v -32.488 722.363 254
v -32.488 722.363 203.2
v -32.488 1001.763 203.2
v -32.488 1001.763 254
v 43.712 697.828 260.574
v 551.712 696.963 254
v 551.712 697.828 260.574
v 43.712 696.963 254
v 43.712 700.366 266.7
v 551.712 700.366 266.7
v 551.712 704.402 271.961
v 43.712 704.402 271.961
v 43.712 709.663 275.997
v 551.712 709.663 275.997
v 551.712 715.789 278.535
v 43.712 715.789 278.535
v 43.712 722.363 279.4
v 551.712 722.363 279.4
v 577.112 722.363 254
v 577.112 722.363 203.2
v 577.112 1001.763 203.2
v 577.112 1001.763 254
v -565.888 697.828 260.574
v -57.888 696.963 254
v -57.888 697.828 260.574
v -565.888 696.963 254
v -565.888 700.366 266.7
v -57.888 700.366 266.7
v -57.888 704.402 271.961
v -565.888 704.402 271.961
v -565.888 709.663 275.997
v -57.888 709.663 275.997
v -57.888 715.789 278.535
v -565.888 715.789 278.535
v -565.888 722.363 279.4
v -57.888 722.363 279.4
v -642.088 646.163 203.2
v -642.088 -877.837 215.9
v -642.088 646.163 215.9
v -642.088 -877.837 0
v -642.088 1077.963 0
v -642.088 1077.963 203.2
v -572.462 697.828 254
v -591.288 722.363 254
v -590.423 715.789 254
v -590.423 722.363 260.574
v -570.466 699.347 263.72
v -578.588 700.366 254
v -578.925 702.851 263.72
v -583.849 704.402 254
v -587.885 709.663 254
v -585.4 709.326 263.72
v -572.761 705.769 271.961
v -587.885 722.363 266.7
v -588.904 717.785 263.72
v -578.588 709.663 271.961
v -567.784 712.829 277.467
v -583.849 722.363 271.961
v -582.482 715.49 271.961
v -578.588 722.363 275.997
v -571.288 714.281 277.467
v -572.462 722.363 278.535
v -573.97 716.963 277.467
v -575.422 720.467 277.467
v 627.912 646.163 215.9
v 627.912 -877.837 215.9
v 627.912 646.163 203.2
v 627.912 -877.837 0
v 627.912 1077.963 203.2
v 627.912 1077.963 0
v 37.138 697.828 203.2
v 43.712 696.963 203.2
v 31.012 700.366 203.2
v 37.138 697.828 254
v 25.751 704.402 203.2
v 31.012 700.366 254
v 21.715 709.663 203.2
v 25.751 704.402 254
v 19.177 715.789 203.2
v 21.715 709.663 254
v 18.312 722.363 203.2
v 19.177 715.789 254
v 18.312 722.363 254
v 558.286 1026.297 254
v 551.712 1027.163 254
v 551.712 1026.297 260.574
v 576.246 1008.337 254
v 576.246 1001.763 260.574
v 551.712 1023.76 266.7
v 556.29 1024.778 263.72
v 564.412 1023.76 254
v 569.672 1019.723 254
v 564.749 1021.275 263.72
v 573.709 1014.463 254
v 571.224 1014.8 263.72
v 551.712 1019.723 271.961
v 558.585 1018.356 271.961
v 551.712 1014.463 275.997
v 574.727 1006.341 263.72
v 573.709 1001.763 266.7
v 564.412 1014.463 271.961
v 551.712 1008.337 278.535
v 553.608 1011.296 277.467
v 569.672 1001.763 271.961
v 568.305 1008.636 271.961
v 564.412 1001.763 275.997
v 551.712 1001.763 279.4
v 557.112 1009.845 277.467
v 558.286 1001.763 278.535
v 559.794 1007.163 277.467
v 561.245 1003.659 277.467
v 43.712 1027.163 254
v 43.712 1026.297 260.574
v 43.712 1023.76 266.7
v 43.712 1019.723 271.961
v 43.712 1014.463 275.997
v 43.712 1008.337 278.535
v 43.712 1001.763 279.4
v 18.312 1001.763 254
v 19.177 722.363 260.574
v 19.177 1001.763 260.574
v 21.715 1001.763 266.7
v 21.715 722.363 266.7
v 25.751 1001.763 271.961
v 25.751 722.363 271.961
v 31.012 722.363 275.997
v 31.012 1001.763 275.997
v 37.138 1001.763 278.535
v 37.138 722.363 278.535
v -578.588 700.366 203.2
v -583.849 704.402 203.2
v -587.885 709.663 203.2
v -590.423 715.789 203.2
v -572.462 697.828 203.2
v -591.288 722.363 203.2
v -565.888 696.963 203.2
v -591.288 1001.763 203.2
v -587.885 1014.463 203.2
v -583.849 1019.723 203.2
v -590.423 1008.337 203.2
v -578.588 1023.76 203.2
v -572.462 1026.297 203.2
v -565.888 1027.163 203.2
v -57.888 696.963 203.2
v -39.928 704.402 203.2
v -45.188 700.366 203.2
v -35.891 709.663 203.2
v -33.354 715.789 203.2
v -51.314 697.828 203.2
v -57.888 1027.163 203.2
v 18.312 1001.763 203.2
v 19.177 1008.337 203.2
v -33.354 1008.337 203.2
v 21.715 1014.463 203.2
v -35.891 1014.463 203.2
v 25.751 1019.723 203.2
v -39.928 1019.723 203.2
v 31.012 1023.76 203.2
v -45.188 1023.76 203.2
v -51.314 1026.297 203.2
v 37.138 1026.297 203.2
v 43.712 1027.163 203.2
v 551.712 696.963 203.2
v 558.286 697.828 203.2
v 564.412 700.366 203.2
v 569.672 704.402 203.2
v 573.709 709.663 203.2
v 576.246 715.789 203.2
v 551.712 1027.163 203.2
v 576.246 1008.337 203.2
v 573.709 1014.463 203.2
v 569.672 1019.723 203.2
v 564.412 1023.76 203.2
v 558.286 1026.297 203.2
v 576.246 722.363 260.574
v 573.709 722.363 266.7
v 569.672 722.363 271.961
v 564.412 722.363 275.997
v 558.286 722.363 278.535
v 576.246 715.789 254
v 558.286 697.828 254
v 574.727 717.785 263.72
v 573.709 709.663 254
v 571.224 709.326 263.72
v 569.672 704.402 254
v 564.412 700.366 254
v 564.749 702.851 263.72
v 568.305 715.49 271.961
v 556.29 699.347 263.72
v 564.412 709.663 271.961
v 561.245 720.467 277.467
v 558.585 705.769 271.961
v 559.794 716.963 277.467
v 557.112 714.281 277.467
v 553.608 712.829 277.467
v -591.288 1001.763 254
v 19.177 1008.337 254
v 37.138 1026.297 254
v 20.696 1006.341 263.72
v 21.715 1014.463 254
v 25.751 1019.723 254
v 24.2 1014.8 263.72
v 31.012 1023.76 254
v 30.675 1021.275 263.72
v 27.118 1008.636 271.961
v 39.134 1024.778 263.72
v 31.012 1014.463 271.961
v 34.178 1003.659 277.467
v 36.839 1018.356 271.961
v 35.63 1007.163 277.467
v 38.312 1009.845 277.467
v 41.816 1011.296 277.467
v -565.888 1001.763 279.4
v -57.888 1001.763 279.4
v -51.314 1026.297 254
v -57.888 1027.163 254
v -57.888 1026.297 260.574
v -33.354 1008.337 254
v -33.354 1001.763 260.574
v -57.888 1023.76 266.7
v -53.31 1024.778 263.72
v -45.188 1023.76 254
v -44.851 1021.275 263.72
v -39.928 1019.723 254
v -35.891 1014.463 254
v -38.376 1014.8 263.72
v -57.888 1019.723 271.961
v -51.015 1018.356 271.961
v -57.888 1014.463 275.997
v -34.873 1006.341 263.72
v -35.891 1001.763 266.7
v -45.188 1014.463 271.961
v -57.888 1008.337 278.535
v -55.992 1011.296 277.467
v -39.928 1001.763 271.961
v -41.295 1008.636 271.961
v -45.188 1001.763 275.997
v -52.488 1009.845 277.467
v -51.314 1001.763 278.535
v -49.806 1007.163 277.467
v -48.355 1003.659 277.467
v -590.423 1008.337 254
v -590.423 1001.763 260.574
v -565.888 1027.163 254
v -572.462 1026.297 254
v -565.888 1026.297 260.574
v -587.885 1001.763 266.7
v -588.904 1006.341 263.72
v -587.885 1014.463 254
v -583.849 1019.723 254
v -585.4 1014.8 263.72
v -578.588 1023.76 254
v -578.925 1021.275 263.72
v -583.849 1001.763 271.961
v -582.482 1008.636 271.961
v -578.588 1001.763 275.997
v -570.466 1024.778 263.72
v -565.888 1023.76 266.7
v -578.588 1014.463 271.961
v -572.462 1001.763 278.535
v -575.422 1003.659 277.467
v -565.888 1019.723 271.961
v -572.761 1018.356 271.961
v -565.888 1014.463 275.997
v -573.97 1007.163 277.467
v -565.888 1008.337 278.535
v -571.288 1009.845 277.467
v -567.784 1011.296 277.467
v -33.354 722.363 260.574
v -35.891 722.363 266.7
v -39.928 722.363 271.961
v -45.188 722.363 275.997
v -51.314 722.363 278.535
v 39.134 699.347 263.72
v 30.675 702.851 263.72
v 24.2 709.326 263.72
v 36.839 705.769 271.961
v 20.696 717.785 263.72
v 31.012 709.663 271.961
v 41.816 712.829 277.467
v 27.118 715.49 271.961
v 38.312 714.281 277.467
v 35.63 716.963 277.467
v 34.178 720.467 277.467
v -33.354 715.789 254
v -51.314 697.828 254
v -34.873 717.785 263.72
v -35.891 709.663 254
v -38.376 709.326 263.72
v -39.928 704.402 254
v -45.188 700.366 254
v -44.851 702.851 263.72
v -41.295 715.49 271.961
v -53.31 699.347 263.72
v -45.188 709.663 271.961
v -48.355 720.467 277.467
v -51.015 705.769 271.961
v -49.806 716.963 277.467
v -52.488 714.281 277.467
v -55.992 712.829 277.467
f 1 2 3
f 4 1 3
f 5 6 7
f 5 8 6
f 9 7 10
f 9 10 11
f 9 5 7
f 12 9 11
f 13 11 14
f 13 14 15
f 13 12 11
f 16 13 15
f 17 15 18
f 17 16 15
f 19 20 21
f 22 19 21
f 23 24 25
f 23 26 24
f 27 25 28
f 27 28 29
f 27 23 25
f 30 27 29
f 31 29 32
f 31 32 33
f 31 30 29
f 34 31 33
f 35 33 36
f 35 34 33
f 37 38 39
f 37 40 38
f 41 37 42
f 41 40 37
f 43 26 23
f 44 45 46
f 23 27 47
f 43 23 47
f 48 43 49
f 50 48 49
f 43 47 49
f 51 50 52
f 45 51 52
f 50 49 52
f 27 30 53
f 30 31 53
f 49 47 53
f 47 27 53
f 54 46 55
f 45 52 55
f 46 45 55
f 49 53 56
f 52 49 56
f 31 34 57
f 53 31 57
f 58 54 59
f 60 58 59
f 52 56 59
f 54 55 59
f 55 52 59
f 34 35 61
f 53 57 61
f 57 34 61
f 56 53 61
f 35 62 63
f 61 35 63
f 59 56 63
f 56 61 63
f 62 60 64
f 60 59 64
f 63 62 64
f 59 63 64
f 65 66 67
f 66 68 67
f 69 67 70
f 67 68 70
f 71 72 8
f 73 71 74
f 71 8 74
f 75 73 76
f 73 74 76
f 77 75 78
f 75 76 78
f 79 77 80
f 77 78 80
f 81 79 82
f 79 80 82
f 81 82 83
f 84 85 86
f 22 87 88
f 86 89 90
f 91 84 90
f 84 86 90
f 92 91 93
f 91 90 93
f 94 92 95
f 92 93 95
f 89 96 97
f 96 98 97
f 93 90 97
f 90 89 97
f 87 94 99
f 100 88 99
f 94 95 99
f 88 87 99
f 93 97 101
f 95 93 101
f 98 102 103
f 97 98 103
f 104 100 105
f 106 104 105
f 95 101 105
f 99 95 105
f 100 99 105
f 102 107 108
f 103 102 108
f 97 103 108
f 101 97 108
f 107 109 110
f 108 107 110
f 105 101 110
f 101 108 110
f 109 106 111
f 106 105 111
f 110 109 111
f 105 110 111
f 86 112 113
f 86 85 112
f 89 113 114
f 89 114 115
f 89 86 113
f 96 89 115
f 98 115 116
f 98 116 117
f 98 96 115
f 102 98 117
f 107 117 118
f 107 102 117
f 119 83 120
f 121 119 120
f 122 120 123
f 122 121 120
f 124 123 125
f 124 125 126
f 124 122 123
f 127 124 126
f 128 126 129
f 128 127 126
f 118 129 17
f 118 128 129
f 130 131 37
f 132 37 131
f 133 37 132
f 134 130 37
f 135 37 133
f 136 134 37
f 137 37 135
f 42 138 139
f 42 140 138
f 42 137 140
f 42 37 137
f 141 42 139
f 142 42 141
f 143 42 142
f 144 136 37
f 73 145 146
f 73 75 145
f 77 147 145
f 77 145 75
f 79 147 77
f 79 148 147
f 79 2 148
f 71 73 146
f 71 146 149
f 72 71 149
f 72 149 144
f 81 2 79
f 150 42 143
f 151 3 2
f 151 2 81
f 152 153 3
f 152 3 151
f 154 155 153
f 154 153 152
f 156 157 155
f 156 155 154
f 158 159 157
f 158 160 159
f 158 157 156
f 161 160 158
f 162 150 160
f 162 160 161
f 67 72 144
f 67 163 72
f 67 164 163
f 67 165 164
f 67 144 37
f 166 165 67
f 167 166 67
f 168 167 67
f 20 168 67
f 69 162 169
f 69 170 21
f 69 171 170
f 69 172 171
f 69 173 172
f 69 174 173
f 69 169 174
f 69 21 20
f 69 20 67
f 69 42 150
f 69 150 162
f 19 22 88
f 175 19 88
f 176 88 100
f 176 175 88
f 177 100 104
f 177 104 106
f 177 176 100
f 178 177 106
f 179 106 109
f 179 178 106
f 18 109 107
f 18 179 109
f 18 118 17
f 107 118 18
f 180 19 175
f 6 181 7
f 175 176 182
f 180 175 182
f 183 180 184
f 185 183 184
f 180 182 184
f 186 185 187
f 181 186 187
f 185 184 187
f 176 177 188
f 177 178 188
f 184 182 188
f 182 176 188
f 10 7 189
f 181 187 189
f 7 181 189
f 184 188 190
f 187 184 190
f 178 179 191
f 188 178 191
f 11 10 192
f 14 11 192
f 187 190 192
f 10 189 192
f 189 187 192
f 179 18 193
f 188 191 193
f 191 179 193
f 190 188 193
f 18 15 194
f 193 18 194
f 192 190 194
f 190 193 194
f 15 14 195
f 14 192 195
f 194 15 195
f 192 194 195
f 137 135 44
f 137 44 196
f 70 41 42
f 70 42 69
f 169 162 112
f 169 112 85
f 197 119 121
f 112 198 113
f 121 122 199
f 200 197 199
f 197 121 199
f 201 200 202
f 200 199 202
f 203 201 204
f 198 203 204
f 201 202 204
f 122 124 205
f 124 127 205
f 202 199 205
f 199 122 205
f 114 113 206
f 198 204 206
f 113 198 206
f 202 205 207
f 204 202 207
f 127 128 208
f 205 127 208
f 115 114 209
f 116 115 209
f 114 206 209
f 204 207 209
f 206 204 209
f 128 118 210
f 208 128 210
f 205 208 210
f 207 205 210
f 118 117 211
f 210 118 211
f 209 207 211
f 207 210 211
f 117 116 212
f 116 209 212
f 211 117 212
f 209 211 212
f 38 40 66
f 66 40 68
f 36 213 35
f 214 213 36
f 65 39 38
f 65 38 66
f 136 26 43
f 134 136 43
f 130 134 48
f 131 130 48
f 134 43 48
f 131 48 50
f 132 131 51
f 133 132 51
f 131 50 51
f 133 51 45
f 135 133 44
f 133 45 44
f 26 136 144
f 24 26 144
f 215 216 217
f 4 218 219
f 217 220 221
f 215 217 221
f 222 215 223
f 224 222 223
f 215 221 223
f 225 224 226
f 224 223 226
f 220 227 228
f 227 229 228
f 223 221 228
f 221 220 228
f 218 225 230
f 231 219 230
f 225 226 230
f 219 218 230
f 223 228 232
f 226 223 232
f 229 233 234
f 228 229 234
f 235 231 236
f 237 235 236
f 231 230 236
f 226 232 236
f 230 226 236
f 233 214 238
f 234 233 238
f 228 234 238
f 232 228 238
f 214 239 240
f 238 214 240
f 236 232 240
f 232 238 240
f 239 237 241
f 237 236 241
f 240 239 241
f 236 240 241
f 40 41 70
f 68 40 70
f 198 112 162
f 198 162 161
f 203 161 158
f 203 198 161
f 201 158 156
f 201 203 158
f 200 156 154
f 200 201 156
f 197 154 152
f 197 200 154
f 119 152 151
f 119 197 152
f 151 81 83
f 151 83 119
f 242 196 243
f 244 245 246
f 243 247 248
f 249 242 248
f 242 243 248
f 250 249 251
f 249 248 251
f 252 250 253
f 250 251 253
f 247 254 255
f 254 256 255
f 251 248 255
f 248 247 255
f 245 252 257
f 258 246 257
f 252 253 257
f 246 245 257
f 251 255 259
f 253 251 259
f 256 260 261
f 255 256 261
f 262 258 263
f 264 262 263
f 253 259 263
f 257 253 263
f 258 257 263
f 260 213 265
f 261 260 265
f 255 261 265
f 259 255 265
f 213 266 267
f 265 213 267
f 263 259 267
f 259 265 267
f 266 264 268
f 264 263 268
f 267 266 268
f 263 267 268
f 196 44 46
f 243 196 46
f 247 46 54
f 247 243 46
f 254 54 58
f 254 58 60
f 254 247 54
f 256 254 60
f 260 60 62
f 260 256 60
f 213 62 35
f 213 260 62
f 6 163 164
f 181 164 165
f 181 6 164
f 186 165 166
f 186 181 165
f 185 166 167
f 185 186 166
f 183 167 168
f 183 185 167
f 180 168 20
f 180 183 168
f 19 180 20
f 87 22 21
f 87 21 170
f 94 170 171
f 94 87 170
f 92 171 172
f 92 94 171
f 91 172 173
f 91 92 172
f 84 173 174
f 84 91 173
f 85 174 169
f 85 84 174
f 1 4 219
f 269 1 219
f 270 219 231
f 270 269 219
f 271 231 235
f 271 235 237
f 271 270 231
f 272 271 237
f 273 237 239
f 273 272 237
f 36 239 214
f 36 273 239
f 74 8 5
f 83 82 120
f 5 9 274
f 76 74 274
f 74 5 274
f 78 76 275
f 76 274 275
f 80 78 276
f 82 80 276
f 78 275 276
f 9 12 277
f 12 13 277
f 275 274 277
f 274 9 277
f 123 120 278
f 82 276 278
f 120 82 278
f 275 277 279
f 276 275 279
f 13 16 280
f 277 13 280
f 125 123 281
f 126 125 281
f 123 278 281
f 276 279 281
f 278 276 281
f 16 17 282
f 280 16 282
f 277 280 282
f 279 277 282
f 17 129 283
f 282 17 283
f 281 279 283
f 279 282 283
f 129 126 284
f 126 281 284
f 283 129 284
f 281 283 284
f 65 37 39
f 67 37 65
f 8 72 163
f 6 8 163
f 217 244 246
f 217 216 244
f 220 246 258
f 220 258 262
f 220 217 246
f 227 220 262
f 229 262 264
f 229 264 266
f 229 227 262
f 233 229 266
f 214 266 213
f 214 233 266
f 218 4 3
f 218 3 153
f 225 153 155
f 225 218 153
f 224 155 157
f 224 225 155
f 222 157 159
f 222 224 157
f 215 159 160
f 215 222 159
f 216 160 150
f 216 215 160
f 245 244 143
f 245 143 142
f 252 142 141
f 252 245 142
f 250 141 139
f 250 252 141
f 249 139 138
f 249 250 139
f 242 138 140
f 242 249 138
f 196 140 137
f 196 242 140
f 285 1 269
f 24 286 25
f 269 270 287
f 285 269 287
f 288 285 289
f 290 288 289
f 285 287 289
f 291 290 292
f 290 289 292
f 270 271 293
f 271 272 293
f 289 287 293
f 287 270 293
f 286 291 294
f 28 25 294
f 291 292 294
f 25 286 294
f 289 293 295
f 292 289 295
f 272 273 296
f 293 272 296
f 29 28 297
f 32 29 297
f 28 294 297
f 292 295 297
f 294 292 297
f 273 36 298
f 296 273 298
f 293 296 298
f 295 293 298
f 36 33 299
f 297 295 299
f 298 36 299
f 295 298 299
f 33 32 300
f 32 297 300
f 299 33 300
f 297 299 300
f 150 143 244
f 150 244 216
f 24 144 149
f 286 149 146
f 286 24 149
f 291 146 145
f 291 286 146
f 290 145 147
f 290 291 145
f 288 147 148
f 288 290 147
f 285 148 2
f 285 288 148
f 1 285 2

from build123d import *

# Parameters (mm, degrees)
F0_W     = 1270
F0_H     = 1955.8
F1_DEPTH = 203.2
F2_W     = 1270
F2_H     = 1524
F3_DEPTH = 12.7
F4_W     = 558.8
F4_H     = 330.2
F5_DEPTH = 76.2
F6_R     = 25.4
F7_R     = 25.4


with BuildPart() as f1:
    # F0 (on Top) → F1 (new body)
    with BuildSketch(Plane.XY):
        with Locations((-7.088182494, 100.0628365508)):
            Rectangle(F0_W, F0_H)
    extrude(amount=F1_DEPTH)

    # F2 (on face) → F3 (join)
    with BuildSketch(Plane.XY.offset(203.2)):
        with Locations((-7.088182494, -115.8371634492)):
            Rectangle(F2_W, F2_H)
    extrude(amount=F3_DEPTH)

    # F4 (on face) → F5 (join)
    with BuildSketch(Plane.XY.offset(203.2)):
        with Locations((-311.888182494, 862.0628365508)):
            Rectangle(F4_W, F4_H)
        with Locations((297.711817506, 862.0628365508)):
            Rectangle(F4_W, F4_H)
    extrude(amount=F5_DEPTH)

    # F6
    f6_edges = [f1.edges().sort_by_distance(p)[0] for p in [
        (-32.488182, 1027.162837, 241.3),
        (-32.488182, 696.962837, 241.3),
        (18.311818, 696.962837, 241.3),
        (18.311818, 1027.162837, 241.3),
        (577.111818, 696.962837, 241.3),
        (577.111818, 1027.162837, 241.3),
        (-591.288182, 1027.162837, 241.3),
        (-591.288182, 696.962837, 241.3),
    ]]
    fillet(f6_edges, radius=F6_R)

    # F7
    f7_edges = [f1.edges().sort_by_distance(p)[0] for p in [
        (-311.888182, 1027.162837, 279.4),
        (-32.488182, 862.062837, 279.4),
        (-39.92767, 1019.723349, 279.4),
        (-39.92767, 704.402324, 279.4),
        (-311.888182, 696.962837, 279.4),
        (-583.848695, 704.402324, 279.4),
        (-591.288182, 862.062837, 279.4),
        (-583.848695, 1019.723349, 279.4),
        (18.311818, 862.062837, 279.4),
        (25.751305, 1019.723349, 279.4),
        (297.711818, 1027.162837, 279.4),
        (569.67233, 1019.723349, 279.4),
        (577.111818, 862.062837, 279.4),
        (569.67233, 704.402324, 279.4),
        (297.711818, 696.962837, 279.4),
        (25.751305, 704.402324, 279.4),
    ]]
    fillet(f7_edges, radius=F7_R)


solid = f1.part
